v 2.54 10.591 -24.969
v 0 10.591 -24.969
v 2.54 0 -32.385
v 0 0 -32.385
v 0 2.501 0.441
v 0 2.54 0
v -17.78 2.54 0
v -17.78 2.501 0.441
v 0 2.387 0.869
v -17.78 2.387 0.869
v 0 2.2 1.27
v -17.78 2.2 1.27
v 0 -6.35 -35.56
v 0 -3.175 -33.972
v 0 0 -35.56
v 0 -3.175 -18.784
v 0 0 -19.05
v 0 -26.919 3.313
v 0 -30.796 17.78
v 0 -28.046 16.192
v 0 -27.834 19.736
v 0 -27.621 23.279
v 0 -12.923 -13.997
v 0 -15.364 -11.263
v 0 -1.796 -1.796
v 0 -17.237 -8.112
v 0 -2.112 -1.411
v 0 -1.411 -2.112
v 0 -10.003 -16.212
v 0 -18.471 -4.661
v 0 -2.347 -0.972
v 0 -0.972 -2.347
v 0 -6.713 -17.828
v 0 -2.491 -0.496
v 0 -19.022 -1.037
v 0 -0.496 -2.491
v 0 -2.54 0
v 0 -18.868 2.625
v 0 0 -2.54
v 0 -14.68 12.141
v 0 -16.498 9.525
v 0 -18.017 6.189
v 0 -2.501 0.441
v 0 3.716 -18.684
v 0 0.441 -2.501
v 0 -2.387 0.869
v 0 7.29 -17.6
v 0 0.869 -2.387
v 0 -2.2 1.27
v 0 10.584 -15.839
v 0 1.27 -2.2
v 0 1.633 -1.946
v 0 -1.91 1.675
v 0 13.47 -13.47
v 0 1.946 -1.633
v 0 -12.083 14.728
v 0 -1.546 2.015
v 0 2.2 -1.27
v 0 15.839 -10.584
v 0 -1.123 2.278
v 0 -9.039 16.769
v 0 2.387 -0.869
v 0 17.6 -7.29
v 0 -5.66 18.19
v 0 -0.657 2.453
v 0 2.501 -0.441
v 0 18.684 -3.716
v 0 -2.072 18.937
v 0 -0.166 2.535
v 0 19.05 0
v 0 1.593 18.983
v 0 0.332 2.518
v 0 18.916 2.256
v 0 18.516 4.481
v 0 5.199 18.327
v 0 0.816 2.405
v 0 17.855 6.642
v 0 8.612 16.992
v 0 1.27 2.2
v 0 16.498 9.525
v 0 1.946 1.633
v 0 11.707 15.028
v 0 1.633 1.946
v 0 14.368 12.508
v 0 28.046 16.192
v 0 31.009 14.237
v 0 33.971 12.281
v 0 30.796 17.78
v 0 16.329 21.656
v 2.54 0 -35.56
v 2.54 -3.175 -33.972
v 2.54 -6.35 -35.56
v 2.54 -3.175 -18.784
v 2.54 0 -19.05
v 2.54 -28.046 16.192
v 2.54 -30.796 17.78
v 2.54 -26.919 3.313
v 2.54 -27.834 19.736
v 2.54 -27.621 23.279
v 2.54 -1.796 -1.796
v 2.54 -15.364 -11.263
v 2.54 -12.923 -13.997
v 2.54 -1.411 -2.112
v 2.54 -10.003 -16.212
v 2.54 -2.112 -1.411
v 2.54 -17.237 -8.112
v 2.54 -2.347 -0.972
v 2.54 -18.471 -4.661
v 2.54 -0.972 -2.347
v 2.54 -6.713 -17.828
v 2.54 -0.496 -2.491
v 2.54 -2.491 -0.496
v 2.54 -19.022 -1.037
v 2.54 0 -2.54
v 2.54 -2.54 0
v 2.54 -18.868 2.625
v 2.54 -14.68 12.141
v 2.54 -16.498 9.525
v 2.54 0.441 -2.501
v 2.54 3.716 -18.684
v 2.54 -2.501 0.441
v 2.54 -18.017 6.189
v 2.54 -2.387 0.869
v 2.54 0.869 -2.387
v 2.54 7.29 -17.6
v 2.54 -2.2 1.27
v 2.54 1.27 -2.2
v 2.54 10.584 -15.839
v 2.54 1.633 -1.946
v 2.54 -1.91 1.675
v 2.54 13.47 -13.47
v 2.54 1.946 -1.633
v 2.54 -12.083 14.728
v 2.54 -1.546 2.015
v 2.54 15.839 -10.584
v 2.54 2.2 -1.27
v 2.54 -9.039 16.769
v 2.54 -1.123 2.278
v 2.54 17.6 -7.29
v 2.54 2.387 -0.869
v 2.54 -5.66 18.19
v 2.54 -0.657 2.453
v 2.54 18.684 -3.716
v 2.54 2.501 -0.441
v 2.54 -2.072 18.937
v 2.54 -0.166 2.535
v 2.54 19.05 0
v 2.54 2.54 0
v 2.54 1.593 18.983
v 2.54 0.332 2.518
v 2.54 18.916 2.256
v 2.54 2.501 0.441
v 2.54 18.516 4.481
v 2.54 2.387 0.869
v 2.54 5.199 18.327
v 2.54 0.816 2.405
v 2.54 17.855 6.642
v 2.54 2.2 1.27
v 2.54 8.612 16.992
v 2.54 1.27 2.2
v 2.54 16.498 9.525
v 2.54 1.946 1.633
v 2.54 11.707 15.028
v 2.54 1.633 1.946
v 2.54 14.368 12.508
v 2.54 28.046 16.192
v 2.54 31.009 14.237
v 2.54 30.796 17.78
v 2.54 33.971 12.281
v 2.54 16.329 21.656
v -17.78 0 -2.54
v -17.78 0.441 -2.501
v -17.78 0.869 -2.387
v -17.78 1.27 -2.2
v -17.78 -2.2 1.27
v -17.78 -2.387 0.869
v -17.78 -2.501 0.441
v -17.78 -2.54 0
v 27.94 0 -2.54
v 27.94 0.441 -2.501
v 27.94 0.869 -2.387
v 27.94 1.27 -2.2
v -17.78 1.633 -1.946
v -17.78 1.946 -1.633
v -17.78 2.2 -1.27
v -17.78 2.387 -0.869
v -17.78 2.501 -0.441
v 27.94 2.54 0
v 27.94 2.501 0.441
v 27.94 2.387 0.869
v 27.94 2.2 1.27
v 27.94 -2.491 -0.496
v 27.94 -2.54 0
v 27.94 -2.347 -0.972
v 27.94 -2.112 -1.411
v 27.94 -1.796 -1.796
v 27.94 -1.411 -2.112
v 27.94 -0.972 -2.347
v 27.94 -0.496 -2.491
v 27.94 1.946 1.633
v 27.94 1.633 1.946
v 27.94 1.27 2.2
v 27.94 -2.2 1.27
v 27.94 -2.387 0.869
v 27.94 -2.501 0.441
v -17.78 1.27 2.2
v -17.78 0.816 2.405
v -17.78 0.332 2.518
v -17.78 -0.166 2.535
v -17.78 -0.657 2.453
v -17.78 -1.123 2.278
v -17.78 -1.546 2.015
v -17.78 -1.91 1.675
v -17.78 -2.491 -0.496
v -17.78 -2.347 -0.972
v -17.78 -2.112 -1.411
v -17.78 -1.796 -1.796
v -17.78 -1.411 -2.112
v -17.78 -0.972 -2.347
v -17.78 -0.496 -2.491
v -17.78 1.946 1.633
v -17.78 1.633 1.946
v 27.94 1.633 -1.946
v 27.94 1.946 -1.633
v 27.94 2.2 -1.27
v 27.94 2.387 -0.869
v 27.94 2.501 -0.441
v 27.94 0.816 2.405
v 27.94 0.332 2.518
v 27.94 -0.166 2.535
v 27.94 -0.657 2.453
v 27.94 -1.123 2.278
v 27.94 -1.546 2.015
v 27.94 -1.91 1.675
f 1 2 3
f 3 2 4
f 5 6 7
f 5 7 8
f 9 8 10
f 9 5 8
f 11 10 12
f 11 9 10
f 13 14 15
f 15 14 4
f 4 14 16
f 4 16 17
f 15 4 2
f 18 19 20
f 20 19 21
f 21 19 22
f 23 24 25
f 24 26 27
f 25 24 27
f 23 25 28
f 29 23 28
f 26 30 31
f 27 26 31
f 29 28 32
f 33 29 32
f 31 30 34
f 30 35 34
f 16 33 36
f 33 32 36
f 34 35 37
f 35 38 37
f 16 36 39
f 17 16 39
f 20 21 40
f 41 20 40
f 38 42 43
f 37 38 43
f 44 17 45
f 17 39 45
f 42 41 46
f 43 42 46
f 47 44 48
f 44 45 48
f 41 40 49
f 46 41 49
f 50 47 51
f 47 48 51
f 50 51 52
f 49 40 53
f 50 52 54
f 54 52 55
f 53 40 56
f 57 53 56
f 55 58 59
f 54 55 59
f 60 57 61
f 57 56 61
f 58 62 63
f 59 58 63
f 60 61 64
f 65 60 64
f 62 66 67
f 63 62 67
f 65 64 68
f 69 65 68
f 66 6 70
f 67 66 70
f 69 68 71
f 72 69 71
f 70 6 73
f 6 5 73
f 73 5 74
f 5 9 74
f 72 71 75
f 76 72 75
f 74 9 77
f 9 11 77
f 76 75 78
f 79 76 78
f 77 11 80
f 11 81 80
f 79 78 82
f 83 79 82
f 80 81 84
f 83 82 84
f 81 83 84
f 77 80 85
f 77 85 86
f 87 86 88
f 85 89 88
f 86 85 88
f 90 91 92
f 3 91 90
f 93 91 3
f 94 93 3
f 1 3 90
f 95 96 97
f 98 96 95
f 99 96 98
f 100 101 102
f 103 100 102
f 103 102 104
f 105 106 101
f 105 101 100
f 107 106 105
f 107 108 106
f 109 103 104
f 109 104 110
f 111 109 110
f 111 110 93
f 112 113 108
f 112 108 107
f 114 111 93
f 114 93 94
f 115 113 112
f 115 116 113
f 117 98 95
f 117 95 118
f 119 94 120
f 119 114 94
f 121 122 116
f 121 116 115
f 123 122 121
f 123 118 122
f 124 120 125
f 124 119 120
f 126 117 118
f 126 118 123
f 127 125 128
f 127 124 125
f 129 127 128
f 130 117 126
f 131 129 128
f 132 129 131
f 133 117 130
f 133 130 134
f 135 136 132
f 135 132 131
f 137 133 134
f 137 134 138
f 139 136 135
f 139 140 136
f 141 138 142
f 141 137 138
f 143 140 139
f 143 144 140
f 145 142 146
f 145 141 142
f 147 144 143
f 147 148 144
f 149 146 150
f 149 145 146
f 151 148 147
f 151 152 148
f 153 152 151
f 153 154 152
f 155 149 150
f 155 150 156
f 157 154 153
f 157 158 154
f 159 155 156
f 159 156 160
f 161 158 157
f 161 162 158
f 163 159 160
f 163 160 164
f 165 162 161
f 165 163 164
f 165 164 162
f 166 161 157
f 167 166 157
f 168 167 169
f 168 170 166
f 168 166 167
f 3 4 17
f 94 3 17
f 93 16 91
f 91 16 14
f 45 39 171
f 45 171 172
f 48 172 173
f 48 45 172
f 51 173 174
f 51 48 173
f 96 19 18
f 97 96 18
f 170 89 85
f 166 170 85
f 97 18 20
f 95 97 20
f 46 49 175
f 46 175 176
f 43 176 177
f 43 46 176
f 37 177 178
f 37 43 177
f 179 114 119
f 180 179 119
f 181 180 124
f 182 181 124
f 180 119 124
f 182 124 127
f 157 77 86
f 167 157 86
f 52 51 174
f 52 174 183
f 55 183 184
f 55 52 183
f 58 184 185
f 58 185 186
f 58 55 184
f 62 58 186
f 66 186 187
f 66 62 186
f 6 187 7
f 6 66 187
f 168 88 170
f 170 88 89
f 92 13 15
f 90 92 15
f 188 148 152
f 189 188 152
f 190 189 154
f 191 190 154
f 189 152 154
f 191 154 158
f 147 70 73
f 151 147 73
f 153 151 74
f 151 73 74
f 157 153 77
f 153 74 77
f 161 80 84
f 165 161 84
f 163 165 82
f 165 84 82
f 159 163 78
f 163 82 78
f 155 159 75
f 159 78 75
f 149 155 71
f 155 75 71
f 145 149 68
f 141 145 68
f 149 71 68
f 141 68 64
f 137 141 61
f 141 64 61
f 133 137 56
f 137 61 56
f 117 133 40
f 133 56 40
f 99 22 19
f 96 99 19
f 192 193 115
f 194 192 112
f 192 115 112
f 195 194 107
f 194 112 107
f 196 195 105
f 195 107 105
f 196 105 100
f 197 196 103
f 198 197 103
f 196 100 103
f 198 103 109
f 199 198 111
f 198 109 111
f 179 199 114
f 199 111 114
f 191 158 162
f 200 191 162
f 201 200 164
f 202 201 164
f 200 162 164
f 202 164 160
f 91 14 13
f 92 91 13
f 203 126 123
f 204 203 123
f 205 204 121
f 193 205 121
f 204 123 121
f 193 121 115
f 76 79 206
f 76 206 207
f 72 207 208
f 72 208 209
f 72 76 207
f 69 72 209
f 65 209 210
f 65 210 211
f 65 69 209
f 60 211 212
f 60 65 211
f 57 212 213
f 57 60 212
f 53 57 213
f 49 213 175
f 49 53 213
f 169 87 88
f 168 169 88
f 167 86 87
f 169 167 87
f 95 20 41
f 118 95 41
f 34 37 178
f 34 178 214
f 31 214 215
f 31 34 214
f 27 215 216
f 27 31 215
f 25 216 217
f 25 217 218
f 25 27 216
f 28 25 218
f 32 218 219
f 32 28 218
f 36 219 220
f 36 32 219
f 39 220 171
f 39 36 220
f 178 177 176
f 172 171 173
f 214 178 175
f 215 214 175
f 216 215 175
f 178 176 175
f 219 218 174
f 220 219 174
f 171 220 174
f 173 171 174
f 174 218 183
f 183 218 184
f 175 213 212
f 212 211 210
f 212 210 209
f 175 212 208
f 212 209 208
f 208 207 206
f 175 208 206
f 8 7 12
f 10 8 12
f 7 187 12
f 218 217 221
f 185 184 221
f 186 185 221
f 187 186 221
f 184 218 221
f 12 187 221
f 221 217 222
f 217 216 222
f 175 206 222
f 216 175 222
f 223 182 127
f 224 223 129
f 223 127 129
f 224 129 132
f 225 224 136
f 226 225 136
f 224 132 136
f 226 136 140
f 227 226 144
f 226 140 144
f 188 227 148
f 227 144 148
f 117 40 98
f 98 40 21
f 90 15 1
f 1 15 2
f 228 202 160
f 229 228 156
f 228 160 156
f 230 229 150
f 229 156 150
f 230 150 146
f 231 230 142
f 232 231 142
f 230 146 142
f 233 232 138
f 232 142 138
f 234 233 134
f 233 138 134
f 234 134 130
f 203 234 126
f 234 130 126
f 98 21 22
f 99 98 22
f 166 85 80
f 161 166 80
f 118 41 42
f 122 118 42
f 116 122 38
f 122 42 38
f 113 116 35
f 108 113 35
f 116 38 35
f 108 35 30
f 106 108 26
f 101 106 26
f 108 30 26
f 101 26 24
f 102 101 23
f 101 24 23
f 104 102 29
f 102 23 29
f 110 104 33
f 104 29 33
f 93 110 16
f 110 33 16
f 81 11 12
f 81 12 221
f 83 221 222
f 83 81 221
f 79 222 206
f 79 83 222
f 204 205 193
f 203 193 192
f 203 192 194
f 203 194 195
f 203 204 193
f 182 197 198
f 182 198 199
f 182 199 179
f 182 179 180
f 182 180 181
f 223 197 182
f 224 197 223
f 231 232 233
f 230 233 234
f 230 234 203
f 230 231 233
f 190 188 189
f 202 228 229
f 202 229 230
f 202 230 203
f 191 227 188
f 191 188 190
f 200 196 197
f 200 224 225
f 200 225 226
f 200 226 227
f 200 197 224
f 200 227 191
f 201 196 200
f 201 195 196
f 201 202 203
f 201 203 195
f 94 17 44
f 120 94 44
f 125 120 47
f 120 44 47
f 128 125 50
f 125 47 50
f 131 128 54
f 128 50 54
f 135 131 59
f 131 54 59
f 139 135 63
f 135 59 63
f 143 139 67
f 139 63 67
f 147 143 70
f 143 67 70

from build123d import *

# Parameters (mm, degrees)
F1_DEPTH = 2.54
F2_DEPTH = 27.94
F3_DEPTH = 17.78


with BuildPart() as f1:
    # F0 (on Right) → F1 (new body)
    with BuildSketch(Plane.YZ):
        with BuildLine():
            ThreePointArc((0, -19.05), (13.4703841816, -13.4703841816), (19.05, 0))
            ThreePointArc((19.05, 0), (18.748751681, 3.3744348271), (17.854534341, 6.6421459987))
            Line((17.854534341, 6.6421459987), (1.5875, -2.749630657))
            Line((1.5875, -2.749630657), (1.27, -2.1997045256))
            ThreePointArc((1.27, -2.1997045256), (0.6574003746, -2.4534515988), (0, -2.54))
            Line((0, -2.54), (0, -19.05))
        make_face()
        with BuildLine():
            Line((1.5875, -2.749630657), (17.854534341, 6.6421459987))
            ThreePointArc((17.854534341, 6.6421459987), (17.2365354597, 8.1119877556), (16.4977839421, 9.525))
            Line((16.4977839421, 9.525), (2.1997045256, 1.27))
            ThreePointArc((2.1997045256, 1.27), (2.4534515988, 0.6574003746), (2.54, 0))
            ThreePointArc((2.54, 0), (2.1997045256, -1.27), (1.27, -2.1997045256))
            Line((1.27, -2.1997045256), (1.5875, -2.749630657))
        make_face()
        with BuildLine():
            ThreePointArc((16.4977839421, 9.525), (17.2365354597, 8.1119877556), (17.854534341, 6.6421459987))
            Line((17.854534341, 6.6421459987), (31.0085480301, 14.236619343))
            Line((31.0085480301, 14.236619343), (28.0462327016, 16.1925))
            Line((28.0462327016, 16.1925), (16.4977839421, 9.525))
        make_face()
        with BuildLine():
            Line((0, -32.385), (0, -19.05))
            ThreePointArc((0, -19.05), (-1.5930802583, -18.9832714591), (-3.175, -18.7835533113))
            Line((-3.175, -18.7835533113), (-3.175, -33.9725))
            Line((-3.175, -33.9725), (0, -32.385))
        make_face()
        with BuildLine():
            ThreePointArc((-3.175, -18.7835533113), (-1.5930802583, -18.9832714591), (0, -19.05))
            Line((0, -19.05), (0, -2.54))
            ThreePointArc((0, -2.54), (-1.7960512242, -1.7960512242), (-2.54, 0))
            Line((-2.54, 0), (-3.175, 0))
            Line((-3.175, 0), (-3.175, -18.7835533113))
        make_face()
        with BuildLine():
            Line((2.1997045256, 1.27), (16.4977839421, 9.525))
            ThreePointArc((16.4977839421, 9.525), (1.5930802583, 18.9832714591), (-14.679534341, 12.1414073127))
            Line((-14.679534341, 12.1414073127), (1.5875, 2.749630657))
            Line((1.5875, 2.749630657), (1.27, 2.1997045256))
            ThreePointArc((1.27, 2.1997045256), (1.7960512242, 1.7960512242), (2.1997045256, 1.27))
        make_face()
        Polygon((28.0462327016, 16.1925), (31.0085480301, 14.236619343), (32.3833633586, 15.030369343), (30.7958633586, 17.78), align=None)
        Polygon((32.3833633586, 15.030369343), (31.0085480301, 14.236619343), (33.9708633586, 12.280738686), align=None)
        with BuildLine():
            ThreePointArc((-16.4977839421, 9.525), (-17.2365354597, -8.1119877556), (-3.175, -18.7835533113))
            Line((-3.175, -18.7835533113), (-3.175, 0))
            Line((-3.175, 0), (-2.54, 0))
            ThreePointArc((-2.54, 0), (-2.4534515988, 0.6574003746), (-2.1997045256, 1.27))
            Line((-2.1997045256, 1.27), (-16.4977839421, 9.525))
        make_face()
        Polygon((10.5906598886, -24.9693401114), (0, -32.385), (0, -35.56), align=None)
        Polygon((0, -35.56), (0, -32.385), (-3.175, -33.9725), (-3.175, -35.56), align=None)
        with BuildLine():
            Line((1.5875, 2.749630657), (-14.679534341, 12.1414073127))
            ThreePointArc((-14.679534341, 12.1414073127), (-15.6434552014, 10.8712837035), (-16.4977839421, 9.525))
            Line((-16.4977839421, 9.525), (-2.1997045256, 1.27))
            ThreePointArc((-2.1997045256, 1.27), (-0.6574003746, 2.4534515988), (1.27, 2.1997045256))
            Line((1.27, 2.1997045256), (1.5875, 2.749630657))
        make_face()
        with BuildLine():
            ThreePointArc((-16.4977839421, 9.525), (-15.6434552014, 10.8712837035), (-14.679534341, 12.1414073127))
            Line((-14.679534341, 12.1414073127), (-27.8335480301, 19.735880657))
            Line((-27.8335480301, 19.735880657), (-28.0462327016, 16.1925))
            Line((-28.0462327016, 16.1925), (-16.4977839421, 9.525))
        make_face()
        Polygon((16.3287529078, 21.6564505621), (28.0462327016, 16.1925), (30.7958633586, 17.78), align=None)
        Polygon((-3.175, -35.56), (-3.175, -33.9725), (-6.35, -35.56), align=None)
        Polygon((-28.0462327016, 16.1925), (-27.8335480301, 19.735880657), (-29.2083633586, 20.529630657), (-30.7958633586, 17.78), align=None)
        Polygon((-29.2083633586, 20.529630657), (-27.8335480301, 19.735880657), (-27.6208633586, 23.279261314), align=None)
        Polygon((-26.9194127965, 3.3128895493), (-28.0462327016, 16.1925), (-30.7958633586, 17.78), align=None)
    extrude(amount=F1_DEPTH)

    # F0 (on Right) → F2 (join)
    with BuildSketch(Plane.YZ):
        with BuildLine():
            Line((-2.1997045256, 1.27), (0, 0))
            Line((0, 0), (1.27, 2.1997045256))
            ThreePointArc((1.27, 2.1997045256), (-0.6574003746, 2.4534515988), (-2.1997045256, 1.27))
        make_face()
        with BuildLine():
            ThreePointArc((-2.1997045256, 1.27), (-2.4534515988, 0.6574003746), (-2.54, 0))
            Line((-2.54, 0), (0, 0))
            Line((0, 0), (-2.1997045256, 1.27))
        make_face()
        with BuildLine():
            ThreePointArc((-2.54, 0), (-1.7960512242, -1.7960512242), (0, -2.54))
            Line((0, -2.54), (0, 0))
            Line((0, 0), (-2.54, 0))
        make_face()
        with BuildLine():
            Line((0, 0), (0, -2.54))
            ThreePointArc((0, -2.54), (0.6574003746, -2.4534515988), (1.27, -2.1997045256))
            Line((1.27, -2.1997045256), (0, 0))
        make_face()
        with BuildLine():
            ThreePointArc((2.54, 0), (2.4534515988, 0.6574003746), (2.1997045256, 1.27))
            Line((2.1997045256, 1.27), (0, 0))
            Line((0, 0), (1.27, -2.1997045256))
            ThreePointArc((1.27, -2.1997045256), (2.1997045256, -1.27), (2.54, 0))
        make_face()
        with BuildLine():
            Line((0, 0), (2.1997045256, 1.27))
            ThreePointArc((2.1997045256, 1.27), (1.7960512242, 1.7960512242), (1.27, 2.1997045256))
            Line((1.27, 2.1997045256), (0, 0))
        make_face()
    extrude(amount=F2_DEPTH)

    # F0 (on Right) → F3 (join)
    with BuildSketch(Plane.YZ):
        with BuildLine():
            ThreePointArc((2.54, 0), (2.4534515988, 0.6574003746), (2.1997045256, 1.27))
            Line((2.1997045256, 1.27), (0, 0))
            Line((0, 0), (1.27, -2.1997045256))
            ThreePointArc((1.27, -2.1997045256), (2.1997045256, -1.27), (2.54, 0))
        make_face()
        with BuildLine():
            Line((0, 0), (0, -2.54))
            ThreePointArc((0, -2.54), (0.6574003746, -2.4534515988), (1.27, -2.1997045256))
            Line((1.27, -2.1997045256), (0, 0))
        make_face()
        with BuildLine():
            ThreePointArc((-2.54, 0), (-1.7960512242, -1.7960512242), (0, -2.54))
            Line((0, -2.54), (0, 0))
            Line((0, 0), (-2.54, 0))
        make_face()
        with BuildLine():
            ThreePointArc((-2.1997045256, 1.27), (-2.4534515988, 0.6574003746), (-2.54, 0))
            Line((-2.54, 0), (0, 0))
            Line((0, 0), (-2.1997045256, 1.27))
        make_face()
        with BuildLine():
            Line((-2.1997045256, 1.27), (0, 0))
            Line((0, 0), (1.27, 2.1997045256))
            ThreePointArc((1.27, 2.1997045256), (-0.6574003746, 2.4534515988), (-2.1997045256, 1.27))
        make_face()
        with BuildLine():
            Line((0, 0), (2.1997045256, 1.27))
            ThreePointArc((2.1997045256, 1.27), (1.7960512242, 1.7960512242), (1.27, 2.1997045256))
            Line((1.27, 2.1997045256), (0, 0))
        make_face()
    extrude(amount=-F3_DEPTH)


solid = f1.part
